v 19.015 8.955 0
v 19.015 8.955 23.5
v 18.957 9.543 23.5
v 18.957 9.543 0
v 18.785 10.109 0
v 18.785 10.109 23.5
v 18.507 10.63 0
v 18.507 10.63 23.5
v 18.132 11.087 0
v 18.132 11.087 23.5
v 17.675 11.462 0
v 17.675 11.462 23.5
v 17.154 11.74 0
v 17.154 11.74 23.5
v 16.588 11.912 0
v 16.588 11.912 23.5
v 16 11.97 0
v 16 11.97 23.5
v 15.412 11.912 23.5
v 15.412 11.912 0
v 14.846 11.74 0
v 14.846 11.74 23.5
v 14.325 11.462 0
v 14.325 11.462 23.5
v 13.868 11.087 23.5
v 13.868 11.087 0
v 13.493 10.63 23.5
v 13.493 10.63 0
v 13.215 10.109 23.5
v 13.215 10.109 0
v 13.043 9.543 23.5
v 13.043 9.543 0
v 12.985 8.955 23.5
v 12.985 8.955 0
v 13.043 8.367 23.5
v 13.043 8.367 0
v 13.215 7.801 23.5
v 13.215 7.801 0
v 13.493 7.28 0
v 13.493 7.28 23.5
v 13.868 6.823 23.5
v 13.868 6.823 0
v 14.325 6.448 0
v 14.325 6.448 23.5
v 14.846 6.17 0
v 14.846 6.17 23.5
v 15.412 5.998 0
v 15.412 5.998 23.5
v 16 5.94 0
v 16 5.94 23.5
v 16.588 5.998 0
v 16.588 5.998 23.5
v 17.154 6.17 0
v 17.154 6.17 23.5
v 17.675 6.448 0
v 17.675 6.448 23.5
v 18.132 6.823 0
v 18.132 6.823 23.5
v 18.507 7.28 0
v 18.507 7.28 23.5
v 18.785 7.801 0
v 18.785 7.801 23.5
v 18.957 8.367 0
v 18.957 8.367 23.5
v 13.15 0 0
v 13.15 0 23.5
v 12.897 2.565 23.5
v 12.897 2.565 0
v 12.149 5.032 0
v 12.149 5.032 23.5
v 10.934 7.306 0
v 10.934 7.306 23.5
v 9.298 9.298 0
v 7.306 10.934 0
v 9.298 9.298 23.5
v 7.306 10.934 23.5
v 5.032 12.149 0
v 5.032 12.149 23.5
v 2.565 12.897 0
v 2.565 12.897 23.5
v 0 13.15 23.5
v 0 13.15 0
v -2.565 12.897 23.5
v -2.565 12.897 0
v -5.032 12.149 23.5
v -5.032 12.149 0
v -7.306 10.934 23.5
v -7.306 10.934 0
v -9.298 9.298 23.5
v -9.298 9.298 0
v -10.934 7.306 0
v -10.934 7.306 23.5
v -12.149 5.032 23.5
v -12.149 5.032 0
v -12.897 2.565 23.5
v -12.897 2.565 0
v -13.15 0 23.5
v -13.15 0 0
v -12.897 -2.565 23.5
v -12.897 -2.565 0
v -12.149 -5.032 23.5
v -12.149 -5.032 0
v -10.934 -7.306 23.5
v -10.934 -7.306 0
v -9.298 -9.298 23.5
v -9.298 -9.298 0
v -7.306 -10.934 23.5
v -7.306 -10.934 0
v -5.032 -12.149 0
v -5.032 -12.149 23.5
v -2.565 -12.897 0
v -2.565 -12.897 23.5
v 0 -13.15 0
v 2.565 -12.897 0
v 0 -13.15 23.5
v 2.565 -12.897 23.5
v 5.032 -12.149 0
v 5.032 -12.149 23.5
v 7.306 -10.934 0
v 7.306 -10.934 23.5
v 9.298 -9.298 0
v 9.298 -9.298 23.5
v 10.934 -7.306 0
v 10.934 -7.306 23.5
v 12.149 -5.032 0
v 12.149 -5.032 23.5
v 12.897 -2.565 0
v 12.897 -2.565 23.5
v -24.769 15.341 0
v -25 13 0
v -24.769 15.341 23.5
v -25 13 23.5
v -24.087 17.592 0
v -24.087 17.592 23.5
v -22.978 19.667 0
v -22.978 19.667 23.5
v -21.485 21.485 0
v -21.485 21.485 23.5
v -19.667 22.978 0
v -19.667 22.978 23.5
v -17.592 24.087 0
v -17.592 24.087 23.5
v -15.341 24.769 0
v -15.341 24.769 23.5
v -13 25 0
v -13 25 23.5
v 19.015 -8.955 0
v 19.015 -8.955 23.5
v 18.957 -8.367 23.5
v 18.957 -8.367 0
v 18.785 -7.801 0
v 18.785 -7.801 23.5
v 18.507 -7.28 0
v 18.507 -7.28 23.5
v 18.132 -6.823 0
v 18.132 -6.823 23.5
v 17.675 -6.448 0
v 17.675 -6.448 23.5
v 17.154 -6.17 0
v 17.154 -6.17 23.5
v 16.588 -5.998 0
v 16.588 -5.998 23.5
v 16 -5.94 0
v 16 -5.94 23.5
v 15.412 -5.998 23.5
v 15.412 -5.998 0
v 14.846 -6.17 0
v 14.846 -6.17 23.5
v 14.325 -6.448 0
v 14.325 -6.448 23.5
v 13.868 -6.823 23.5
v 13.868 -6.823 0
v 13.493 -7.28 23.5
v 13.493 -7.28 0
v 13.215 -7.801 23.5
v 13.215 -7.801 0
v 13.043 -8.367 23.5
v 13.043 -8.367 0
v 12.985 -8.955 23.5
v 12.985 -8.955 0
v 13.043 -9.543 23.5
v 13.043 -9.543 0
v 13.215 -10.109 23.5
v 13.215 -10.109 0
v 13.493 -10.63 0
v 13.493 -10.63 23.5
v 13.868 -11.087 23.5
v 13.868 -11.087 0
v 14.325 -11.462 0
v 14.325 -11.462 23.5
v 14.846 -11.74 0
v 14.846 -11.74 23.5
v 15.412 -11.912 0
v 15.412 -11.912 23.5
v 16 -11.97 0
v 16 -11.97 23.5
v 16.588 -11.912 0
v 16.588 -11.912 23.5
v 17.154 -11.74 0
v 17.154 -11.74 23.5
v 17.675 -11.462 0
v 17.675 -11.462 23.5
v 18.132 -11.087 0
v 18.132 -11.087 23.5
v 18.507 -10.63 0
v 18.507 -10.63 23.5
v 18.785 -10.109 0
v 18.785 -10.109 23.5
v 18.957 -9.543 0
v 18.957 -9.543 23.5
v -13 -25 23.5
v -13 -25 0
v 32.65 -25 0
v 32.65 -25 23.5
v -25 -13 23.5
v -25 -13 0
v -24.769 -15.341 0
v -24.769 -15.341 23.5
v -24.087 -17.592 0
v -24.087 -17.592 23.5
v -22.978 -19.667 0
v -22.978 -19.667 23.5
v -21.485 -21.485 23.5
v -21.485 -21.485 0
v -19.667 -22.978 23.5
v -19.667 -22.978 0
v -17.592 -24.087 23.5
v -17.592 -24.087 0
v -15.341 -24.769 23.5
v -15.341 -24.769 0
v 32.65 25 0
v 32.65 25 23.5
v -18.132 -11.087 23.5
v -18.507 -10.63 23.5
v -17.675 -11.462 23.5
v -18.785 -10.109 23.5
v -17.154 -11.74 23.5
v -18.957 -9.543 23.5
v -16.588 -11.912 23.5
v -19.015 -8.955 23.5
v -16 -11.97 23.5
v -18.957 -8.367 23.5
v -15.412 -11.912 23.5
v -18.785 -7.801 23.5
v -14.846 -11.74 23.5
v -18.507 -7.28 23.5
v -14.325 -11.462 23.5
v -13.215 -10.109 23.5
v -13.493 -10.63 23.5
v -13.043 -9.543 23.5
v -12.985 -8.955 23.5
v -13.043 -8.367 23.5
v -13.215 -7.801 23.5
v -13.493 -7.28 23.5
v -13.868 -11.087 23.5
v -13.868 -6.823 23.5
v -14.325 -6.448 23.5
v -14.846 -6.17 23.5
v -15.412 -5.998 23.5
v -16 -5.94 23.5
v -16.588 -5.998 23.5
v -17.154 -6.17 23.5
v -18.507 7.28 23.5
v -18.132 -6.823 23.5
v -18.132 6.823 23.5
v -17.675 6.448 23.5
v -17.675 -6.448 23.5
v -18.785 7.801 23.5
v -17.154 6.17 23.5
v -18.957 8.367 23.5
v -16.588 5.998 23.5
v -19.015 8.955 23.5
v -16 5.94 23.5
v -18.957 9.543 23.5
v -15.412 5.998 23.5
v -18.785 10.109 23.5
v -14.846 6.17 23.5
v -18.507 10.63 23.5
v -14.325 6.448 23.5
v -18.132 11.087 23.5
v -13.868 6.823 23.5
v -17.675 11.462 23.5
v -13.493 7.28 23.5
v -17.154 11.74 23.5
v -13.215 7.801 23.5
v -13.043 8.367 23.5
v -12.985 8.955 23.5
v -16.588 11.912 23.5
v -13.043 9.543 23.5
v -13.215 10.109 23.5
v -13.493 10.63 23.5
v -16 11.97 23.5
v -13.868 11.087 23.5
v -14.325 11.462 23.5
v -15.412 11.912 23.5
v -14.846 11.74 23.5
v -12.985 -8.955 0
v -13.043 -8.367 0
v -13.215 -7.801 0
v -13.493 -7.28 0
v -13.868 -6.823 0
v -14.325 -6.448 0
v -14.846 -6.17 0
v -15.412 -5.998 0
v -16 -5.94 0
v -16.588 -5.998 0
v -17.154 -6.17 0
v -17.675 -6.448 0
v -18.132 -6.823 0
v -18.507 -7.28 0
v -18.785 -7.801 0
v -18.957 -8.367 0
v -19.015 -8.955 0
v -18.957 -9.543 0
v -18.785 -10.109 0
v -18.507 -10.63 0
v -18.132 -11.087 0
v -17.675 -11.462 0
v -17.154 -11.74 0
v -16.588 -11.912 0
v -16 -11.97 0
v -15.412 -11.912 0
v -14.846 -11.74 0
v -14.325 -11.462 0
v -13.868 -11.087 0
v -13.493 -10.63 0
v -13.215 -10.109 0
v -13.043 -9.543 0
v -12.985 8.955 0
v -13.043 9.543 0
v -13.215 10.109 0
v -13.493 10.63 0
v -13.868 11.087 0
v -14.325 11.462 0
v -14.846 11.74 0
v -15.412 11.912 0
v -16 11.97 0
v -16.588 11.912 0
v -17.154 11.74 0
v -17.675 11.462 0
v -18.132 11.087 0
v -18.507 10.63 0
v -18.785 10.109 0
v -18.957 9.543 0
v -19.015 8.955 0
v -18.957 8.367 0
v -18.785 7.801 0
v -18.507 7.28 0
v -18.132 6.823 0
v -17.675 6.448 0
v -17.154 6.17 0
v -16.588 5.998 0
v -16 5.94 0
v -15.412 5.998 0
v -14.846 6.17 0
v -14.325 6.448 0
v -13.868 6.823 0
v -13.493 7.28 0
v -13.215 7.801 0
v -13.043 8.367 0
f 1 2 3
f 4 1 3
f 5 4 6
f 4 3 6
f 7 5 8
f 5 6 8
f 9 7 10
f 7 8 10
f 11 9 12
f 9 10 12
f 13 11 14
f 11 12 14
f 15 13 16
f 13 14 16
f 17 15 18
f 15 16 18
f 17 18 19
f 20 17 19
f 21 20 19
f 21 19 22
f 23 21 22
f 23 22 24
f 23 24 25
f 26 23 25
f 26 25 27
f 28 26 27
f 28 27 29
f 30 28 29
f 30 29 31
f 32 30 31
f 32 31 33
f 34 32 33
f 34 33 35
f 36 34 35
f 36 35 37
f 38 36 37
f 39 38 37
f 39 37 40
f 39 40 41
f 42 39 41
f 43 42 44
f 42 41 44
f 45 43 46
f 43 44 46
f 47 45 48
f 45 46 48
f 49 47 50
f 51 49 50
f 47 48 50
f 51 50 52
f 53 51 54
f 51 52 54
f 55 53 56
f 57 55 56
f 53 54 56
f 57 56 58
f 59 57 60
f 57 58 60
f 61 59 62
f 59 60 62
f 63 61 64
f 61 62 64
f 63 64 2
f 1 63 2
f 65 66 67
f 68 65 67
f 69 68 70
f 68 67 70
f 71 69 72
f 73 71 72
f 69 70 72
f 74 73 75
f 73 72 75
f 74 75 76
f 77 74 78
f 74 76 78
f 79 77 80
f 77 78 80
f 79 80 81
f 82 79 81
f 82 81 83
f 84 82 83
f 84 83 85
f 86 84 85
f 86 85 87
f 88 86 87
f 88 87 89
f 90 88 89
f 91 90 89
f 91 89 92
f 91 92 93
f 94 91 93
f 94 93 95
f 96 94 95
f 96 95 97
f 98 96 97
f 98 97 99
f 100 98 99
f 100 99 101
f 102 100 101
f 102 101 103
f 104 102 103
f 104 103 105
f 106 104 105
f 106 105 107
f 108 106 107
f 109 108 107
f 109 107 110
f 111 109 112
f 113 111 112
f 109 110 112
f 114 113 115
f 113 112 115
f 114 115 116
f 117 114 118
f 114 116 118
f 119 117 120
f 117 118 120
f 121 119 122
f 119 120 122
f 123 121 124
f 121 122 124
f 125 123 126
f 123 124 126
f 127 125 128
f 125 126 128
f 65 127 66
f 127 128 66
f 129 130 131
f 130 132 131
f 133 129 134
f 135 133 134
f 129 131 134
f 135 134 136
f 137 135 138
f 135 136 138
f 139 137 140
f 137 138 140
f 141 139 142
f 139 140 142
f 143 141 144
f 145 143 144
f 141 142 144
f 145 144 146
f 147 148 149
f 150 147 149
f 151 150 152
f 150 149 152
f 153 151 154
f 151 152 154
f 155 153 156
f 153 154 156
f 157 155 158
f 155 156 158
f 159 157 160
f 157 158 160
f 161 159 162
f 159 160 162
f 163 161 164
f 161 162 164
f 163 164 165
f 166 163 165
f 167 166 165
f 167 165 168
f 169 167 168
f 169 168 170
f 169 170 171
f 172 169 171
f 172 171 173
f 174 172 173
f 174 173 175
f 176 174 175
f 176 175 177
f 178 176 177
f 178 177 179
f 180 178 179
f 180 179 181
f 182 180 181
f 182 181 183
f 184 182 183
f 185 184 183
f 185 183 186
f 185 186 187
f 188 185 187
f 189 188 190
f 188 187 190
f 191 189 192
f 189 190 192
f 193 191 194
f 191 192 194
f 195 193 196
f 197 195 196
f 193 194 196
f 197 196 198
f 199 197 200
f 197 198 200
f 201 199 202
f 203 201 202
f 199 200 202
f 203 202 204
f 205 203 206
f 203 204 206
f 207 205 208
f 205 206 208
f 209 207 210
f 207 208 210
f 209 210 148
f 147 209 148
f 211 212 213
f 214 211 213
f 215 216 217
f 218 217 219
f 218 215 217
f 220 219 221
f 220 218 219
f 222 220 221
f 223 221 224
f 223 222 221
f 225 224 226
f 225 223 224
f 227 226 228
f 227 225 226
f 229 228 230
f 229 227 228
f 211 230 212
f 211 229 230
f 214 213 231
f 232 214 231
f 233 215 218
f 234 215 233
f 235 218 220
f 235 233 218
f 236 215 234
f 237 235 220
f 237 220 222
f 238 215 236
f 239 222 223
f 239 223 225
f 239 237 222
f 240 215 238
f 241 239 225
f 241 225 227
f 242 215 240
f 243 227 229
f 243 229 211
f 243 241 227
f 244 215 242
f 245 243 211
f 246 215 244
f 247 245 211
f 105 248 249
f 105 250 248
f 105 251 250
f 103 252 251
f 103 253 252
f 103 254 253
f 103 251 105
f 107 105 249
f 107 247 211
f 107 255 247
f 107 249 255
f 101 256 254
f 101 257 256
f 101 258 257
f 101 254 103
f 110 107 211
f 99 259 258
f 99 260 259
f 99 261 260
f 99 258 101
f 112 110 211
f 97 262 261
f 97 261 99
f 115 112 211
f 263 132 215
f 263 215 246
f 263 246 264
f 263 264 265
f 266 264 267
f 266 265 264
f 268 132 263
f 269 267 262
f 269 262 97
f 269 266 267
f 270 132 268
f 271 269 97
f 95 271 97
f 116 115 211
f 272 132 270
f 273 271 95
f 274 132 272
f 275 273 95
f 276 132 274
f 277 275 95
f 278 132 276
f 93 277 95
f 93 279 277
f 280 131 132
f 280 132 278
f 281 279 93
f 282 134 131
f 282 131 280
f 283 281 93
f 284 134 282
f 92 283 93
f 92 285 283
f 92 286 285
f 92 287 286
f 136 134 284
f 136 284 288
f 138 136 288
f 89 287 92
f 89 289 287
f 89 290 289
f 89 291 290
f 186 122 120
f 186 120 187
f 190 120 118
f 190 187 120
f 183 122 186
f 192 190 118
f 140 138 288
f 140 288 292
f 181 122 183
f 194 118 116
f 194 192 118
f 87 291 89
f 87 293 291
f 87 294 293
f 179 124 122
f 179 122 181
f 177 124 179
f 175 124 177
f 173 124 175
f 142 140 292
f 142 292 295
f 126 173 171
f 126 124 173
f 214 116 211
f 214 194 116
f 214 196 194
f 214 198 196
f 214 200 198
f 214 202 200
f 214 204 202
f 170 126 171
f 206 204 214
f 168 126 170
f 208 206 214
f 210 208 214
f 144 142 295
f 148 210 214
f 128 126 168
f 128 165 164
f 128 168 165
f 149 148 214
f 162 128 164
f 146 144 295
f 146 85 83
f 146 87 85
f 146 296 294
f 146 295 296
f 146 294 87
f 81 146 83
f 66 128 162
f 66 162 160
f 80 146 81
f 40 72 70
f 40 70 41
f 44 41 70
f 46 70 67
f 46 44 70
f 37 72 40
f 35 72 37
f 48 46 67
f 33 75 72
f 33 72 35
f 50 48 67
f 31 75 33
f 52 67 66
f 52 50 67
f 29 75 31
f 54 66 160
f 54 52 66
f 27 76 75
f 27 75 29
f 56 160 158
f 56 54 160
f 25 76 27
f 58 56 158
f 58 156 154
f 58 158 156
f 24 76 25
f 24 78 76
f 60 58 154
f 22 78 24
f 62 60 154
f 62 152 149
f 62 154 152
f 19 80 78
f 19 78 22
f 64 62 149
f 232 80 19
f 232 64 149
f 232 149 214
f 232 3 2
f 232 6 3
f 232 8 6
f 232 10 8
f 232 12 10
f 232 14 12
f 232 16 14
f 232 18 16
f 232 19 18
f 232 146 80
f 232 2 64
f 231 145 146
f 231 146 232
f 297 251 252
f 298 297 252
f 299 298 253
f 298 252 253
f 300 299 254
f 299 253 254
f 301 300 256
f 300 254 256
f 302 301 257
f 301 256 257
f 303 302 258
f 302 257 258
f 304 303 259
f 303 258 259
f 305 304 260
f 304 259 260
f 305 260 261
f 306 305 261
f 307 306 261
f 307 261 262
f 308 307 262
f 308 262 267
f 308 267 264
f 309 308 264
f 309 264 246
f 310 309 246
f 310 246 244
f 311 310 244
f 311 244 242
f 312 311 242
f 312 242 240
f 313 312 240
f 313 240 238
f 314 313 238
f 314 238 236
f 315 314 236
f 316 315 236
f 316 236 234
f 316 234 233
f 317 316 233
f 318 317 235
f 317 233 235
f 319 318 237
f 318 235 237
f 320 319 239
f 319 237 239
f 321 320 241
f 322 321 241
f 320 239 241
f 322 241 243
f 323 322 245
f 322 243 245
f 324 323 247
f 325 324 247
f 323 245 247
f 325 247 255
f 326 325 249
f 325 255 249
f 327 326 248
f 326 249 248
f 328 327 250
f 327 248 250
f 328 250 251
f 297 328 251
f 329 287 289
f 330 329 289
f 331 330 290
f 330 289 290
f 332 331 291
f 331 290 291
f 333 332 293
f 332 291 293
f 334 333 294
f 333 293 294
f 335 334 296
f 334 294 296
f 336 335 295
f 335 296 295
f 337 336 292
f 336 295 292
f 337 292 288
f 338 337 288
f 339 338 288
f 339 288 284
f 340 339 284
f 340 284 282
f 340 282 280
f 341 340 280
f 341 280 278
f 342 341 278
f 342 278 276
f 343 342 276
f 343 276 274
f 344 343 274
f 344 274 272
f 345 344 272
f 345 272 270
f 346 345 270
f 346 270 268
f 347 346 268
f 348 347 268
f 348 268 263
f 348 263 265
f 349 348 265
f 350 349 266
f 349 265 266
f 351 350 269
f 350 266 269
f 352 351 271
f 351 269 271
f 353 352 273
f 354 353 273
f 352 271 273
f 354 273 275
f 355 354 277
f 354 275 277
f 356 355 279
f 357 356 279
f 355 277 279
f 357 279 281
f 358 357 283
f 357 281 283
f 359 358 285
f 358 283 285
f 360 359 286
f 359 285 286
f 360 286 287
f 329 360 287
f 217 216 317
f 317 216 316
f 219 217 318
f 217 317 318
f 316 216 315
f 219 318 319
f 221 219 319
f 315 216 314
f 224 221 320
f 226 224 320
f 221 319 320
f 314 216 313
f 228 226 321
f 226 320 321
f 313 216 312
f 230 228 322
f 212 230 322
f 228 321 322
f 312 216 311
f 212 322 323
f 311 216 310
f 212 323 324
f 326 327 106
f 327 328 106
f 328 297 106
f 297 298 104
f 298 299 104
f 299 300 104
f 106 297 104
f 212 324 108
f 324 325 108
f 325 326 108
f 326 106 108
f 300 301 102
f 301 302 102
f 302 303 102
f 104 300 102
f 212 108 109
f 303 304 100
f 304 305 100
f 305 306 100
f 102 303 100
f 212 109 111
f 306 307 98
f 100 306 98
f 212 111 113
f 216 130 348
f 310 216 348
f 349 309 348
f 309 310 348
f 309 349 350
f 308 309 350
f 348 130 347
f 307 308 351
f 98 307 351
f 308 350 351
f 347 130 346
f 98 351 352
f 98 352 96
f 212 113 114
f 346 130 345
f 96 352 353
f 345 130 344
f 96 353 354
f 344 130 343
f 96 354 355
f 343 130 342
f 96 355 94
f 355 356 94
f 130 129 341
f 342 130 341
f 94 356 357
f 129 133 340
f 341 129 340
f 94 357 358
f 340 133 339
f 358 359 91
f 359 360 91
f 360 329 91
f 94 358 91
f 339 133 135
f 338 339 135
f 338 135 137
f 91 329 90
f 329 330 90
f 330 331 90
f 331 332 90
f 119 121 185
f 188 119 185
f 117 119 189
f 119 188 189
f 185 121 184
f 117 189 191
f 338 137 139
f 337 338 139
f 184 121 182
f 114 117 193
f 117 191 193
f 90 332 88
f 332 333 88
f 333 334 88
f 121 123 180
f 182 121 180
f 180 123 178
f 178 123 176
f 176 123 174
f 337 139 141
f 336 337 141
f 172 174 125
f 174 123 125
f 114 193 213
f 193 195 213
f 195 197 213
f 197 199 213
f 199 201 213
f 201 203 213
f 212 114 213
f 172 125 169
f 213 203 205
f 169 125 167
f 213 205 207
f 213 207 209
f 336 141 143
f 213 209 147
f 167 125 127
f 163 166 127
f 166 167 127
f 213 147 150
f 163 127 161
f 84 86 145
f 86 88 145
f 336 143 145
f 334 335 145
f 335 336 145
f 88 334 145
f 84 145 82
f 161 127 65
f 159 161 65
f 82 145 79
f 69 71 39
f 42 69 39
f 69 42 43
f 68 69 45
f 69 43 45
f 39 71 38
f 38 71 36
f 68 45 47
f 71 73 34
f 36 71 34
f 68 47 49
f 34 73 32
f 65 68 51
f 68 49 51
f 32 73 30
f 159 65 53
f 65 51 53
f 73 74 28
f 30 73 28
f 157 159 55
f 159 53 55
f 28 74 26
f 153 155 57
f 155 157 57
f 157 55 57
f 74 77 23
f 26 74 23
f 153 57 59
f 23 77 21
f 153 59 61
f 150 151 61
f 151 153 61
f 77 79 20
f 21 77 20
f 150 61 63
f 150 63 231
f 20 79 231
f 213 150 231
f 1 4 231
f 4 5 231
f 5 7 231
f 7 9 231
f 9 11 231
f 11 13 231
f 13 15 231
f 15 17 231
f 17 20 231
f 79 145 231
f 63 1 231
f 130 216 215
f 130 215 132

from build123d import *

# Parameters (mm, degrees)
SKETCH008_W  = 57.65
SKETCH008_H  = 50
PAD_DEPTH    = 23.5
SKETCH_R     = 13.15
HOLE_DEPTH   = 23.6
SKETCH009_R  = 3.015
POCKET_DEPTH = 23.501
FILLET_R     = 12


with BuildPart() as part:
    # Sketch008 → Pad (new body)
    with BuildSketch(Plane.XY):
        with Locations((3.825, 0)):
            Rectangle(SKETCH008_W, SKETCH008_H)
    extrude(amount=PAD_DEPTH)

    # Sketch (on Face6 of Pad) → Hole (cut)
    with BuildSketch(Plane.XY.offset(23.5)):
        Circle(SKETCH_R)
    extrude(amount=-HOLE_DEPTH, mode=Mode.SUBTRACT)

    # Sketch009 (on Face5 of Hole) → Pocket (cut, through all)
    with BuildSketch(Plane.XY.offset(23.5)):
        with Locations((-16, 8.955)):
            Circle(SKETCH009_R)
        with Locations((-16, -8.955)):
            Circle(SKETCH009_R)
        with Locations((16, 8.955)):
            Circle(SKETCH009_R)
        with Locations((16, -8.955)):
            Circle(SKETCH009_R)
    extrude(amount=-POCKET_DEPTH, mode=Mode.SUBTRACT)

    # Fillet
    fillet_edges = [part.edges().sort_by_distance(p)[0] for p in [
        (-25, 25, 11.75),
        (-25, -25, 11.75),
    ]]
    fillet(fillet_edges, radius=FILLET_R)


solid = part.part
